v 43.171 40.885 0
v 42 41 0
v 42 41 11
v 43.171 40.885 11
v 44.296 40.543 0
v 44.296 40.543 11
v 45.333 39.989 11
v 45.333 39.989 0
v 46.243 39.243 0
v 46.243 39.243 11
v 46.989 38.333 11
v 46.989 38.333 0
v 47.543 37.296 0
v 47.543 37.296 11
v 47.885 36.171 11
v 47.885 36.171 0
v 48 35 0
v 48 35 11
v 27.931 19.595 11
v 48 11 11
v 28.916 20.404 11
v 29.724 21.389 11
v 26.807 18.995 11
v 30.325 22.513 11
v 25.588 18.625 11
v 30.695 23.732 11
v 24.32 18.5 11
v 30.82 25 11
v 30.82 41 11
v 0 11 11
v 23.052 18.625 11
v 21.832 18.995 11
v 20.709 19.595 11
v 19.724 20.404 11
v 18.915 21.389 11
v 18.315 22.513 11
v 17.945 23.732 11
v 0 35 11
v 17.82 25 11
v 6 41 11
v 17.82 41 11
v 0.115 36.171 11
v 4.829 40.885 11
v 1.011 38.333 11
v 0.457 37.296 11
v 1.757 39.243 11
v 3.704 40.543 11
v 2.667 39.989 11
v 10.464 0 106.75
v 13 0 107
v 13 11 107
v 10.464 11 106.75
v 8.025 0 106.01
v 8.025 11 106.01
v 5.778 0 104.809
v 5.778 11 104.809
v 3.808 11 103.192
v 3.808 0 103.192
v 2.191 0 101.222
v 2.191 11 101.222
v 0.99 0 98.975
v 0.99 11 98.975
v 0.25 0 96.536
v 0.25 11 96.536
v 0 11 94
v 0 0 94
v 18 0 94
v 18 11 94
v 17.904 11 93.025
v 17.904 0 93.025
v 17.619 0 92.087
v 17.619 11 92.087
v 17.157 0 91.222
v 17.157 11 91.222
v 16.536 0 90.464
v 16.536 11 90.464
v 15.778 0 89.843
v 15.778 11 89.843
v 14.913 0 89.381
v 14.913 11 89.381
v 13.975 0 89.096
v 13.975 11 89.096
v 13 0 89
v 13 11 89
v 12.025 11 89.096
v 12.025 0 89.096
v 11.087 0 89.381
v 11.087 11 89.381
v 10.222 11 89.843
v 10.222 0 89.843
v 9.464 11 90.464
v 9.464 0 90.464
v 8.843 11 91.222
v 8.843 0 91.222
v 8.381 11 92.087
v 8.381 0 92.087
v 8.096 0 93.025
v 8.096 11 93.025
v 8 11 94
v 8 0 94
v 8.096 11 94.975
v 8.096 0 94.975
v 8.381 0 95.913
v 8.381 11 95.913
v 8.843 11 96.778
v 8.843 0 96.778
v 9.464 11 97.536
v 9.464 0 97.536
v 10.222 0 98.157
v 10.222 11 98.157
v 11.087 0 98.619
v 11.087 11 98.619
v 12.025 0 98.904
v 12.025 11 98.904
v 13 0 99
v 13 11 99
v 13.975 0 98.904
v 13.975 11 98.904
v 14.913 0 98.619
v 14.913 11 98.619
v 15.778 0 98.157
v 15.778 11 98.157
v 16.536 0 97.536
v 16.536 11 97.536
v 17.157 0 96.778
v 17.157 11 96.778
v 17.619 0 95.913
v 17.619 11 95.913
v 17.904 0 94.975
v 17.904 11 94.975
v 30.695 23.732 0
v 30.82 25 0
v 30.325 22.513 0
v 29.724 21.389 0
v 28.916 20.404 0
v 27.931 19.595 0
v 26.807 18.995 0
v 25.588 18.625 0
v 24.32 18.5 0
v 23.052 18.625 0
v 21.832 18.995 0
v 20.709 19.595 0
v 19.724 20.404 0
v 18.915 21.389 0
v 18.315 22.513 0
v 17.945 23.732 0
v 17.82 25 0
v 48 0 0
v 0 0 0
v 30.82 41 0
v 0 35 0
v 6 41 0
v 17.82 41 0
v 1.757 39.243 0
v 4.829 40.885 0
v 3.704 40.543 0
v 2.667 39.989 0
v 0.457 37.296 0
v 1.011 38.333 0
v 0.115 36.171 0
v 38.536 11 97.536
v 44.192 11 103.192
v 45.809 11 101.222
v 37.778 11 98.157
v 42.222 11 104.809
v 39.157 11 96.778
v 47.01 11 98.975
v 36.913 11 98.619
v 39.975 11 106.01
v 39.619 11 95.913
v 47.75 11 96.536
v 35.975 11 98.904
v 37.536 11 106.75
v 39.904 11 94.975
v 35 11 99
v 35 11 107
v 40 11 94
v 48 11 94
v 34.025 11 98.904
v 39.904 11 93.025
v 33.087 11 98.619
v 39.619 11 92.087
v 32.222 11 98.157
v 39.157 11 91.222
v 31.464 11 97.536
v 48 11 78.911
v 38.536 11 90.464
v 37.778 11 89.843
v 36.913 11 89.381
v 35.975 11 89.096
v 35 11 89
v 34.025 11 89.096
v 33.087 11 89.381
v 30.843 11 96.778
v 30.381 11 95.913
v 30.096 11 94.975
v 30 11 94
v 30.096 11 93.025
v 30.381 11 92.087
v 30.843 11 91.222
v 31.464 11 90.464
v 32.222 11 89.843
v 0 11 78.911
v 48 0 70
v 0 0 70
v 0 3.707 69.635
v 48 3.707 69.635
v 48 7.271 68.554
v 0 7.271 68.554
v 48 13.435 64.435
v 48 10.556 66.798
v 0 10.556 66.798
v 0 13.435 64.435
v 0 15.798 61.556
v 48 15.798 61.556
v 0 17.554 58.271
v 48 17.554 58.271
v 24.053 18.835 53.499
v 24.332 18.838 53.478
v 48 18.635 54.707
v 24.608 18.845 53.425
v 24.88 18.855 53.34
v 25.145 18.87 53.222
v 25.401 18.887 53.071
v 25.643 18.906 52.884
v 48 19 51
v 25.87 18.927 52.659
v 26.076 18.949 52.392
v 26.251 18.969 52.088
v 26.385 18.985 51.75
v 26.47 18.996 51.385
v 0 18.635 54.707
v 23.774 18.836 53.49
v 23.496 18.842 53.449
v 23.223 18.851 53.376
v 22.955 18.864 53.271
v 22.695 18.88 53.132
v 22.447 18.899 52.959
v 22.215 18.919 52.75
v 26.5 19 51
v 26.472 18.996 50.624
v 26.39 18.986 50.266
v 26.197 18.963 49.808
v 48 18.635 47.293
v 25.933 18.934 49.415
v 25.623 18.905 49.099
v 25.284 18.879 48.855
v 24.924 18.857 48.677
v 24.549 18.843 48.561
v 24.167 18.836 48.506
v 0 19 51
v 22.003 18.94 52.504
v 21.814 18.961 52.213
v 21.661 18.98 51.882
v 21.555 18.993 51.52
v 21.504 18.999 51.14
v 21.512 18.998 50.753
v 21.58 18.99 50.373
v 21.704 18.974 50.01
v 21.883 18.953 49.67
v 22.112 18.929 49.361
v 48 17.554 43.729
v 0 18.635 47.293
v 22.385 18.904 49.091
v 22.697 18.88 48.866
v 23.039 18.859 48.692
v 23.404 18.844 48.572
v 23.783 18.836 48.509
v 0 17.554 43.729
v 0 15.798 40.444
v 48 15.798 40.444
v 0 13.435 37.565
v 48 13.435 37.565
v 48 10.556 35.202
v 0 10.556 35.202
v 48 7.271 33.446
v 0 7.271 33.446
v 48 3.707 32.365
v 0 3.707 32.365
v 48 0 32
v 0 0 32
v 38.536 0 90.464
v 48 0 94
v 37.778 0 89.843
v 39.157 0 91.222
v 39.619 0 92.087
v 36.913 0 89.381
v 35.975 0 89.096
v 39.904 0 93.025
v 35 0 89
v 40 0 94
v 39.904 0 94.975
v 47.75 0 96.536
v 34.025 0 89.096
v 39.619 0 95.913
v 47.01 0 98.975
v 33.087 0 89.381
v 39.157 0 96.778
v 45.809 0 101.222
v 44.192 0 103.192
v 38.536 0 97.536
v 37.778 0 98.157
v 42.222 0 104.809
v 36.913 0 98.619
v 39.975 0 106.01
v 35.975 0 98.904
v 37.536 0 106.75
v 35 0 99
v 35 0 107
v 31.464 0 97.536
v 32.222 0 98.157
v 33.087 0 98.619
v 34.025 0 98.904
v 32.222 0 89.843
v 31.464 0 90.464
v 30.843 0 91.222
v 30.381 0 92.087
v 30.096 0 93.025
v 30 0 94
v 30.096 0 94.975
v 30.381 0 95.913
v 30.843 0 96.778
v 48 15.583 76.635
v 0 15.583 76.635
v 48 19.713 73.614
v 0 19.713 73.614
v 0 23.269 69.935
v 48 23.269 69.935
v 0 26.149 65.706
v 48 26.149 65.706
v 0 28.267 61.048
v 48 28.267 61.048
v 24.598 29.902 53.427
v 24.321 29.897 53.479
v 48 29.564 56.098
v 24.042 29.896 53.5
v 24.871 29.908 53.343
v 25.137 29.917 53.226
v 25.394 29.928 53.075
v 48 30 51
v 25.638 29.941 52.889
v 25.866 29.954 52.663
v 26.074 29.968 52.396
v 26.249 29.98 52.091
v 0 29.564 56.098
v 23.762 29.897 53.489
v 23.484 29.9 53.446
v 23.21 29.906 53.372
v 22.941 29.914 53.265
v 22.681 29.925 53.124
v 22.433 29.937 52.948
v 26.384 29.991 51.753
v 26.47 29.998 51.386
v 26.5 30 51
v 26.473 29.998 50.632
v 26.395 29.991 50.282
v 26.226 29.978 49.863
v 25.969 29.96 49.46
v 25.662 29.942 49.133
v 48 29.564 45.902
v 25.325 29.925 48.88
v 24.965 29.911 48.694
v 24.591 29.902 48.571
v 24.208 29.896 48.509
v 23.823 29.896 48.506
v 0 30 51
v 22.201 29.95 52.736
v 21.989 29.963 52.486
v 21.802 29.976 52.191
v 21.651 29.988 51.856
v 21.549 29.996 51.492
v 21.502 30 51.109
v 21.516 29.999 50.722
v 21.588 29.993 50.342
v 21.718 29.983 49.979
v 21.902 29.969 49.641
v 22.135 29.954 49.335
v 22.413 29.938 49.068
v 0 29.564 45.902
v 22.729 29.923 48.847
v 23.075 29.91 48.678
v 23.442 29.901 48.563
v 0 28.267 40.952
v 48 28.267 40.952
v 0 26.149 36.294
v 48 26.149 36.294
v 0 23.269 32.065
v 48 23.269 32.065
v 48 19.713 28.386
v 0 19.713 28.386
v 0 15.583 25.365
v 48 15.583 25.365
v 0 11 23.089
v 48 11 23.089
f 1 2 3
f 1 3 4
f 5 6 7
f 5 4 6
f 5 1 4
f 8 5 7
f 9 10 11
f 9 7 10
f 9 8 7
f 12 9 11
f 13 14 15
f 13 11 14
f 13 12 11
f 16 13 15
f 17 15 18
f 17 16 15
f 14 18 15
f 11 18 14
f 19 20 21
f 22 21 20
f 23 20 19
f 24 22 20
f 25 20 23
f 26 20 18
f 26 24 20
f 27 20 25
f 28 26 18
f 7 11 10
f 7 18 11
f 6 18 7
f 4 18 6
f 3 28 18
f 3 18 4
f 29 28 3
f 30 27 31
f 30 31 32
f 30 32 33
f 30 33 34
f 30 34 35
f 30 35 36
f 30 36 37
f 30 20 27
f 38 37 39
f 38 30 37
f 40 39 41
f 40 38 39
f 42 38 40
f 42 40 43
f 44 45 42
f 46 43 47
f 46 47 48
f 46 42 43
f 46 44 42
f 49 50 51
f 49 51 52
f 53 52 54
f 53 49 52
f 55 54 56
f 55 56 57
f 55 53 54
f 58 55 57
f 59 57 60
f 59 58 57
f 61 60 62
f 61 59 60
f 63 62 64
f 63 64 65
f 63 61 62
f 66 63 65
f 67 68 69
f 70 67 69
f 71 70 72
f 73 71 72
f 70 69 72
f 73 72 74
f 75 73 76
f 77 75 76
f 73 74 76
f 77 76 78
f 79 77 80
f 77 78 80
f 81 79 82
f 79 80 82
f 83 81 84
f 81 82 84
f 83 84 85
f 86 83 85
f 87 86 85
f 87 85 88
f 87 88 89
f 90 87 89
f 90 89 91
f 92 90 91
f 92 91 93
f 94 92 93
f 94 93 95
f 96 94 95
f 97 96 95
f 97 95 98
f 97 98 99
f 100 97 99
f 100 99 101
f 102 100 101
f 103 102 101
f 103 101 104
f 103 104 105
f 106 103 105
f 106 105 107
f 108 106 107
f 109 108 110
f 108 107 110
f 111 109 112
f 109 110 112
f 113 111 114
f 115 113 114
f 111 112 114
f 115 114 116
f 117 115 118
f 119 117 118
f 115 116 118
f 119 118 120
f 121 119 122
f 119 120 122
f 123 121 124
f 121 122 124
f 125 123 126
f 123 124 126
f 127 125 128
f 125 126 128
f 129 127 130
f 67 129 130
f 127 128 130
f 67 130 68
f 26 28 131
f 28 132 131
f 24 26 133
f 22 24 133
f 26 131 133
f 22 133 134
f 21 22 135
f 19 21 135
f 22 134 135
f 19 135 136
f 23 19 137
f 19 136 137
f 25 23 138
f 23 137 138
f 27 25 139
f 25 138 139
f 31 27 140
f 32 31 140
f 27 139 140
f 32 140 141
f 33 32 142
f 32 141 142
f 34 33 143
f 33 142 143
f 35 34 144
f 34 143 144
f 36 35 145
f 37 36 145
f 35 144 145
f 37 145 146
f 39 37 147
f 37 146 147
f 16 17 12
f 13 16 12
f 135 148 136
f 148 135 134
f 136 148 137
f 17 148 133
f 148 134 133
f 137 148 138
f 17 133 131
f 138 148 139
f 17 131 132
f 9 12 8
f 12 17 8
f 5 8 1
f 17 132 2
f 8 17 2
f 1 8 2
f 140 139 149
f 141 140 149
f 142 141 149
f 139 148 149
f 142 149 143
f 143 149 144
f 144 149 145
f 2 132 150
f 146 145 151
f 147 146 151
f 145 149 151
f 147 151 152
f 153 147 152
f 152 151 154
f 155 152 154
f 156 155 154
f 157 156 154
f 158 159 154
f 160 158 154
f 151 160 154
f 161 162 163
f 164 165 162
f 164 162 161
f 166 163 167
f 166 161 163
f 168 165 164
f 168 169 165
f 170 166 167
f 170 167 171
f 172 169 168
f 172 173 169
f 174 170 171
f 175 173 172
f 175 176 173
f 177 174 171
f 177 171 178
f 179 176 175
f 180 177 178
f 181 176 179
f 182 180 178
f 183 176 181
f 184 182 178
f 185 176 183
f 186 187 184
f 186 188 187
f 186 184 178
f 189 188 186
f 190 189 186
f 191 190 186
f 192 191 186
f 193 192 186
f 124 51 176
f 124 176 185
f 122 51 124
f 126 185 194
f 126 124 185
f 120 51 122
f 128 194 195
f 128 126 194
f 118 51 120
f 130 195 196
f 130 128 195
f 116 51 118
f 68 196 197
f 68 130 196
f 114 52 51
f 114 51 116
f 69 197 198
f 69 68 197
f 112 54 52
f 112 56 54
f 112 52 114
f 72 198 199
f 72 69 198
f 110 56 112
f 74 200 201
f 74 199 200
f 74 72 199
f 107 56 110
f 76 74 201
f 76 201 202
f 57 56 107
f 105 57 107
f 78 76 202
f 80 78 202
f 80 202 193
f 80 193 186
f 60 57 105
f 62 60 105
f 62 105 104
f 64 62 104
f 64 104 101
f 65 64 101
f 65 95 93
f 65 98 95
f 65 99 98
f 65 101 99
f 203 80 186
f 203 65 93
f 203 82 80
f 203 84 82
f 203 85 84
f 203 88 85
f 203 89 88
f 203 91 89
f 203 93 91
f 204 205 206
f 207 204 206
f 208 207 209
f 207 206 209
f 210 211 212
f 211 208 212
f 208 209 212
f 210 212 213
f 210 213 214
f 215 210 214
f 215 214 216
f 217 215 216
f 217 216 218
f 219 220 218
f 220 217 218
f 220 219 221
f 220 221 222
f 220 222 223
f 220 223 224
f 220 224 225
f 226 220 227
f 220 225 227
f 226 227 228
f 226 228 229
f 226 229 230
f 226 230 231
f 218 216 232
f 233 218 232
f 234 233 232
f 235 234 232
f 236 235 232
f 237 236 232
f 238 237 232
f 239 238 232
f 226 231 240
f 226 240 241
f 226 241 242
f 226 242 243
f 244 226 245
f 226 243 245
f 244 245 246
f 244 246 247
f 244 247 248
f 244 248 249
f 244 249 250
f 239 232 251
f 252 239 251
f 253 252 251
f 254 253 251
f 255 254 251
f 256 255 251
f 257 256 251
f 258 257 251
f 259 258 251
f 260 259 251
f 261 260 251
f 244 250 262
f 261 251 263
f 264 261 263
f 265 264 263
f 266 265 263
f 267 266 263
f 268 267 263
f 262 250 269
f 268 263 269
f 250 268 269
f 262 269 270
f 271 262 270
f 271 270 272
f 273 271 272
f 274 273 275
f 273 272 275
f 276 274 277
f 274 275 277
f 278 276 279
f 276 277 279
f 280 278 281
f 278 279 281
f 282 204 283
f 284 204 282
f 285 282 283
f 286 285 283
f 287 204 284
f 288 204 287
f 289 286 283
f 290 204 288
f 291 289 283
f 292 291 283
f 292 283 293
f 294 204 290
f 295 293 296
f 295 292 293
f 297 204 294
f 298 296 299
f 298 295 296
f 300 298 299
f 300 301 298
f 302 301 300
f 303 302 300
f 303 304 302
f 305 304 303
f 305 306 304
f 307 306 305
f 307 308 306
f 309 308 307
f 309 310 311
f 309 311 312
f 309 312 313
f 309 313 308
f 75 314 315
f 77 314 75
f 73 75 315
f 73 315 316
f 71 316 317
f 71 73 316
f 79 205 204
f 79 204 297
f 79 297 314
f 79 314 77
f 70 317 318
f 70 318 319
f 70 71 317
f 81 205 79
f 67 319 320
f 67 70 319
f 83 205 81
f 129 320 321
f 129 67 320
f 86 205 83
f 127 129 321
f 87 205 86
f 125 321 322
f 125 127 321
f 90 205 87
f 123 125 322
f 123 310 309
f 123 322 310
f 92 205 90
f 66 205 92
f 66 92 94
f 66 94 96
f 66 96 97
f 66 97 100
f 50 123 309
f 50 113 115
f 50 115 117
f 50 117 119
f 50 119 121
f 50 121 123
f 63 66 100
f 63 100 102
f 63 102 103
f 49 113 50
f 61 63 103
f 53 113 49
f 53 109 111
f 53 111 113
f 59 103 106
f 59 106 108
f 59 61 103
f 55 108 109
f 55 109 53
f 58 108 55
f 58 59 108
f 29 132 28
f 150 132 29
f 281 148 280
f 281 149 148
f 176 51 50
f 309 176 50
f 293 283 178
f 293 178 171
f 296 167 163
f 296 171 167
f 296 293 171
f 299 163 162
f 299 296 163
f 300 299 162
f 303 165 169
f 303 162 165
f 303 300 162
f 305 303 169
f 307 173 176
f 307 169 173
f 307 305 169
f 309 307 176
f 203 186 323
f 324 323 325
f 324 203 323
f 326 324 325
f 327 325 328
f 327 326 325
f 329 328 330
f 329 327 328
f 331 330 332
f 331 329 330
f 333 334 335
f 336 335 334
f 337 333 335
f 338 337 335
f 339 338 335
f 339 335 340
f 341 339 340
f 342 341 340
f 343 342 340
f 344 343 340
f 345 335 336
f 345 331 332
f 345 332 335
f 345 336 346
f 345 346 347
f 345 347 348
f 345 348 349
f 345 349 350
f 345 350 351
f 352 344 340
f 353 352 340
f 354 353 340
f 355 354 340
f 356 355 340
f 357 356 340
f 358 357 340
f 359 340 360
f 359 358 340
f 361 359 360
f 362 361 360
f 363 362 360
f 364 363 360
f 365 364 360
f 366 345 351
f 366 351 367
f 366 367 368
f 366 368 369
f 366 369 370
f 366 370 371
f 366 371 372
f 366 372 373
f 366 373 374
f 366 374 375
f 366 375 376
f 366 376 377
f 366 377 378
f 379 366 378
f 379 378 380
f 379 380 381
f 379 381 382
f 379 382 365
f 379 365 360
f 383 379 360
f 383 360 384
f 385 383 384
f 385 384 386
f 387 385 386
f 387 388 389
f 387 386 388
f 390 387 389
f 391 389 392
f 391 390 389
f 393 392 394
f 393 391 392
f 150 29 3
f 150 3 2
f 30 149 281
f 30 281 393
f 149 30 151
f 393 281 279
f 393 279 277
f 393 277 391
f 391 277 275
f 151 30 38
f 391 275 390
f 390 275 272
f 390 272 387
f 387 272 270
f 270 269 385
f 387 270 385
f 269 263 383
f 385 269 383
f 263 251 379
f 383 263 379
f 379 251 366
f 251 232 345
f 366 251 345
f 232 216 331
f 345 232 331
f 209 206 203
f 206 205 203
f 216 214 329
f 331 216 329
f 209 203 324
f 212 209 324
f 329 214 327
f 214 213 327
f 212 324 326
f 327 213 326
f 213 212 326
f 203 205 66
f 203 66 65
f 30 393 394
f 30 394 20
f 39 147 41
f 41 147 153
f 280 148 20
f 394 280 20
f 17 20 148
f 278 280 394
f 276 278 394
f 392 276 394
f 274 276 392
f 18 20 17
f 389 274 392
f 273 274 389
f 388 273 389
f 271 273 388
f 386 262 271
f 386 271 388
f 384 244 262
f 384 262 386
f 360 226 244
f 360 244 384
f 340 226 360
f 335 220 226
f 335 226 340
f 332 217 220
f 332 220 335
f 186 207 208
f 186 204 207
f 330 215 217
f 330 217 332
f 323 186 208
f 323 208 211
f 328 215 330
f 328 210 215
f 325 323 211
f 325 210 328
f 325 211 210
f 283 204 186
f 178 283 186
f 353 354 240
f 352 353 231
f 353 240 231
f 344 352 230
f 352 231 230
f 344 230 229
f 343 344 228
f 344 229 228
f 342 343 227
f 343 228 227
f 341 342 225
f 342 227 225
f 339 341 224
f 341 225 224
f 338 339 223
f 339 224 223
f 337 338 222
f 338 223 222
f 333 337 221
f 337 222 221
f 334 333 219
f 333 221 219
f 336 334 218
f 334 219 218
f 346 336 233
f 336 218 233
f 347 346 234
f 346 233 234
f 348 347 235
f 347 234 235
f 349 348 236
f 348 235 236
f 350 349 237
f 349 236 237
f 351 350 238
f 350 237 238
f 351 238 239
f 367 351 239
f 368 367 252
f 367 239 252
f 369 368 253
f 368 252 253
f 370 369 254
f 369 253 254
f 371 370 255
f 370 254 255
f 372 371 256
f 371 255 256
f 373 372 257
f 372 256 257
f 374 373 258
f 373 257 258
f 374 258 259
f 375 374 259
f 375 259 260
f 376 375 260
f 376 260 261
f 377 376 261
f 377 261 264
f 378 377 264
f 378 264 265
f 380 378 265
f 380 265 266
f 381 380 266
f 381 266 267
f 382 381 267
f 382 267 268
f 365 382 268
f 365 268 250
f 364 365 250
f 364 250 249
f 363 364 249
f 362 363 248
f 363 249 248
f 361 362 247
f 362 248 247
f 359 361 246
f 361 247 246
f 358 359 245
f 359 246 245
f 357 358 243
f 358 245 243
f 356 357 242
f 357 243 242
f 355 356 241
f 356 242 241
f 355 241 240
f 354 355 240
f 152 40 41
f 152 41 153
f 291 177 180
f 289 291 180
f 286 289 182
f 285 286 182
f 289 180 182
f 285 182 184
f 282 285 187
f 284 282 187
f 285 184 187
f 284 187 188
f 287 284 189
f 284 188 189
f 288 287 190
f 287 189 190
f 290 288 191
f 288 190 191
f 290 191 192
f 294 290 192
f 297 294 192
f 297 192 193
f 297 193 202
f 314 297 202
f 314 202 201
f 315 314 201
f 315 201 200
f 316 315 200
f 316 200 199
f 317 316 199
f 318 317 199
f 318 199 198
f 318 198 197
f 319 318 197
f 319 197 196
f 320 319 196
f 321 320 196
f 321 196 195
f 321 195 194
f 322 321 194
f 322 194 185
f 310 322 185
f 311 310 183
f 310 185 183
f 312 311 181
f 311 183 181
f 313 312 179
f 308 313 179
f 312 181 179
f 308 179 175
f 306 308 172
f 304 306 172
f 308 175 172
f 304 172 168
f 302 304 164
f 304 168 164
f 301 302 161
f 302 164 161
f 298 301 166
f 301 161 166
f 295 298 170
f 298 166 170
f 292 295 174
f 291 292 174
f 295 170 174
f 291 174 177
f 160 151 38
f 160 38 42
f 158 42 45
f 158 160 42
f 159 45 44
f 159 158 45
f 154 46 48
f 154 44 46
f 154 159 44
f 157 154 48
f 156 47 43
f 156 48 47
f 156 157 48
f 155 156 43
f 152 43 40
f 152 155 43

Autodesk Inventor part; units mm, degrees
ref_plane "YZ Plane" through (0, 0, 0) normal (1, 0, 0) x (0, 1, 0)
ref_plane "XZ Plane" through (0, 0, 0) normal (0, 1, 0) x (-1, 0, 0)
ref_plane "XY Plane" through (0, 0, 0) normal (0, 0, 1) x (1, 0, 0)
sketch "Sketch1" plane through (0, 0, 0) normal (1, 0, 0) x (0, 1, 0)
  line L0 (0, 0) -> (0, 32)
  arc A0 (0, 32) -> (0, 70) centre (0, 51) ccw
  line L1 (0, 70) -> (0, 107)
  line L2 (0, 0) -> (41, 0)
  line L3 (11, 107) -> (11, 78.9106)
  arc A1 (11, 23.0894) -> (11, 78.9106) centre (0, 51) ccw
  line L4 (11, 23.0894) -> (11, 11)
  line L5 (11, 11) -> (41, 11)
  line L6 (11, 107) -> (0, 107)
  line L7 (41, 11) -> (41, 0)
  dimension "d0" = 32
  dimension "d1" = 70
  dimension "d2" = 37
  dimension "d3" = 41
  dimension "d4" = 11
extrude "Extrusion1" add sketch "Sketch1" along normal blind 48
fillet "Fillet1" radius 13 1 edges at (48, 5.5, 107)
fillet "Fillet2" radius 13 1 edges at (0, 5.5, 107)
sketch "Sketch2" plane through (0, 11, 78.9106) normal (0, 1, 0) x (1, 0, 0)
  arc A0 (0, -15.0894) -> (13, -28.0894) centre (13, -15.0894) ccw projected
  circle A1 centre (13, -15.0894) radius 5
  arc A2 (35, -28.0894) -> (48, -15.0894) centre (35, -15.0894) ccw projected
  circle A3 centre (35, -15.0894) radius 5
  point P0 (0, 78.9106)
  dimension "d9" = 10
  dimension "d10" = 10
extrude "Extrusion2" cut sketch "Sketch2" against normal blind 11
fillet "Fillet3" radius 6 1 edges at (48, 41, 5.5)
fillet "Fillet4" radius 6 1 edges at (0, 41, 5.5)
sketch "Sketch3" plane through (48, 0, 0) normal (0, 0, -1) x (-1, 0, 0)
  line L0 (57.6, 0) -> (-9.6, 0) construction
  line L1 (48, -8.2) -> (48, 49.2) projected
  arc A0 (17.1801, 25) -> (30.1801, 25) centre (23.6801, 25) ccw
  line L2 (17.1801, 25) -> (17.1801, 41)
  line L3 (42, 41) -> (6, 41) projected
  line L4 (30.1801, 25) -> (30.1801, 41)
  point P0 (48, 0)
  dimension "d15" = 25
  dimension "d16" = 13
extrude "Extrusion3" cut sketch "Sketch3" against normal blind 11
sketch "Sketch4" plane through (0, 0, 0) normal (0, -1, 0) x (1, 0, 0)
  line L0 (0, 32) -> (48, 32) projected
  line L1 (0, 32) -> (0, 70) projected
  circle A0 centre (24, 51) radius 2.5
  point P0 (0, 0)
  point P1 (24, 32)
  point P2 (0, 51)
  dimension "d19" = 24
  dimension "d20" = 5
extrude "Extrusion4" cut sketch "Sketch4" against normal blind 41
properties part number "T05"
